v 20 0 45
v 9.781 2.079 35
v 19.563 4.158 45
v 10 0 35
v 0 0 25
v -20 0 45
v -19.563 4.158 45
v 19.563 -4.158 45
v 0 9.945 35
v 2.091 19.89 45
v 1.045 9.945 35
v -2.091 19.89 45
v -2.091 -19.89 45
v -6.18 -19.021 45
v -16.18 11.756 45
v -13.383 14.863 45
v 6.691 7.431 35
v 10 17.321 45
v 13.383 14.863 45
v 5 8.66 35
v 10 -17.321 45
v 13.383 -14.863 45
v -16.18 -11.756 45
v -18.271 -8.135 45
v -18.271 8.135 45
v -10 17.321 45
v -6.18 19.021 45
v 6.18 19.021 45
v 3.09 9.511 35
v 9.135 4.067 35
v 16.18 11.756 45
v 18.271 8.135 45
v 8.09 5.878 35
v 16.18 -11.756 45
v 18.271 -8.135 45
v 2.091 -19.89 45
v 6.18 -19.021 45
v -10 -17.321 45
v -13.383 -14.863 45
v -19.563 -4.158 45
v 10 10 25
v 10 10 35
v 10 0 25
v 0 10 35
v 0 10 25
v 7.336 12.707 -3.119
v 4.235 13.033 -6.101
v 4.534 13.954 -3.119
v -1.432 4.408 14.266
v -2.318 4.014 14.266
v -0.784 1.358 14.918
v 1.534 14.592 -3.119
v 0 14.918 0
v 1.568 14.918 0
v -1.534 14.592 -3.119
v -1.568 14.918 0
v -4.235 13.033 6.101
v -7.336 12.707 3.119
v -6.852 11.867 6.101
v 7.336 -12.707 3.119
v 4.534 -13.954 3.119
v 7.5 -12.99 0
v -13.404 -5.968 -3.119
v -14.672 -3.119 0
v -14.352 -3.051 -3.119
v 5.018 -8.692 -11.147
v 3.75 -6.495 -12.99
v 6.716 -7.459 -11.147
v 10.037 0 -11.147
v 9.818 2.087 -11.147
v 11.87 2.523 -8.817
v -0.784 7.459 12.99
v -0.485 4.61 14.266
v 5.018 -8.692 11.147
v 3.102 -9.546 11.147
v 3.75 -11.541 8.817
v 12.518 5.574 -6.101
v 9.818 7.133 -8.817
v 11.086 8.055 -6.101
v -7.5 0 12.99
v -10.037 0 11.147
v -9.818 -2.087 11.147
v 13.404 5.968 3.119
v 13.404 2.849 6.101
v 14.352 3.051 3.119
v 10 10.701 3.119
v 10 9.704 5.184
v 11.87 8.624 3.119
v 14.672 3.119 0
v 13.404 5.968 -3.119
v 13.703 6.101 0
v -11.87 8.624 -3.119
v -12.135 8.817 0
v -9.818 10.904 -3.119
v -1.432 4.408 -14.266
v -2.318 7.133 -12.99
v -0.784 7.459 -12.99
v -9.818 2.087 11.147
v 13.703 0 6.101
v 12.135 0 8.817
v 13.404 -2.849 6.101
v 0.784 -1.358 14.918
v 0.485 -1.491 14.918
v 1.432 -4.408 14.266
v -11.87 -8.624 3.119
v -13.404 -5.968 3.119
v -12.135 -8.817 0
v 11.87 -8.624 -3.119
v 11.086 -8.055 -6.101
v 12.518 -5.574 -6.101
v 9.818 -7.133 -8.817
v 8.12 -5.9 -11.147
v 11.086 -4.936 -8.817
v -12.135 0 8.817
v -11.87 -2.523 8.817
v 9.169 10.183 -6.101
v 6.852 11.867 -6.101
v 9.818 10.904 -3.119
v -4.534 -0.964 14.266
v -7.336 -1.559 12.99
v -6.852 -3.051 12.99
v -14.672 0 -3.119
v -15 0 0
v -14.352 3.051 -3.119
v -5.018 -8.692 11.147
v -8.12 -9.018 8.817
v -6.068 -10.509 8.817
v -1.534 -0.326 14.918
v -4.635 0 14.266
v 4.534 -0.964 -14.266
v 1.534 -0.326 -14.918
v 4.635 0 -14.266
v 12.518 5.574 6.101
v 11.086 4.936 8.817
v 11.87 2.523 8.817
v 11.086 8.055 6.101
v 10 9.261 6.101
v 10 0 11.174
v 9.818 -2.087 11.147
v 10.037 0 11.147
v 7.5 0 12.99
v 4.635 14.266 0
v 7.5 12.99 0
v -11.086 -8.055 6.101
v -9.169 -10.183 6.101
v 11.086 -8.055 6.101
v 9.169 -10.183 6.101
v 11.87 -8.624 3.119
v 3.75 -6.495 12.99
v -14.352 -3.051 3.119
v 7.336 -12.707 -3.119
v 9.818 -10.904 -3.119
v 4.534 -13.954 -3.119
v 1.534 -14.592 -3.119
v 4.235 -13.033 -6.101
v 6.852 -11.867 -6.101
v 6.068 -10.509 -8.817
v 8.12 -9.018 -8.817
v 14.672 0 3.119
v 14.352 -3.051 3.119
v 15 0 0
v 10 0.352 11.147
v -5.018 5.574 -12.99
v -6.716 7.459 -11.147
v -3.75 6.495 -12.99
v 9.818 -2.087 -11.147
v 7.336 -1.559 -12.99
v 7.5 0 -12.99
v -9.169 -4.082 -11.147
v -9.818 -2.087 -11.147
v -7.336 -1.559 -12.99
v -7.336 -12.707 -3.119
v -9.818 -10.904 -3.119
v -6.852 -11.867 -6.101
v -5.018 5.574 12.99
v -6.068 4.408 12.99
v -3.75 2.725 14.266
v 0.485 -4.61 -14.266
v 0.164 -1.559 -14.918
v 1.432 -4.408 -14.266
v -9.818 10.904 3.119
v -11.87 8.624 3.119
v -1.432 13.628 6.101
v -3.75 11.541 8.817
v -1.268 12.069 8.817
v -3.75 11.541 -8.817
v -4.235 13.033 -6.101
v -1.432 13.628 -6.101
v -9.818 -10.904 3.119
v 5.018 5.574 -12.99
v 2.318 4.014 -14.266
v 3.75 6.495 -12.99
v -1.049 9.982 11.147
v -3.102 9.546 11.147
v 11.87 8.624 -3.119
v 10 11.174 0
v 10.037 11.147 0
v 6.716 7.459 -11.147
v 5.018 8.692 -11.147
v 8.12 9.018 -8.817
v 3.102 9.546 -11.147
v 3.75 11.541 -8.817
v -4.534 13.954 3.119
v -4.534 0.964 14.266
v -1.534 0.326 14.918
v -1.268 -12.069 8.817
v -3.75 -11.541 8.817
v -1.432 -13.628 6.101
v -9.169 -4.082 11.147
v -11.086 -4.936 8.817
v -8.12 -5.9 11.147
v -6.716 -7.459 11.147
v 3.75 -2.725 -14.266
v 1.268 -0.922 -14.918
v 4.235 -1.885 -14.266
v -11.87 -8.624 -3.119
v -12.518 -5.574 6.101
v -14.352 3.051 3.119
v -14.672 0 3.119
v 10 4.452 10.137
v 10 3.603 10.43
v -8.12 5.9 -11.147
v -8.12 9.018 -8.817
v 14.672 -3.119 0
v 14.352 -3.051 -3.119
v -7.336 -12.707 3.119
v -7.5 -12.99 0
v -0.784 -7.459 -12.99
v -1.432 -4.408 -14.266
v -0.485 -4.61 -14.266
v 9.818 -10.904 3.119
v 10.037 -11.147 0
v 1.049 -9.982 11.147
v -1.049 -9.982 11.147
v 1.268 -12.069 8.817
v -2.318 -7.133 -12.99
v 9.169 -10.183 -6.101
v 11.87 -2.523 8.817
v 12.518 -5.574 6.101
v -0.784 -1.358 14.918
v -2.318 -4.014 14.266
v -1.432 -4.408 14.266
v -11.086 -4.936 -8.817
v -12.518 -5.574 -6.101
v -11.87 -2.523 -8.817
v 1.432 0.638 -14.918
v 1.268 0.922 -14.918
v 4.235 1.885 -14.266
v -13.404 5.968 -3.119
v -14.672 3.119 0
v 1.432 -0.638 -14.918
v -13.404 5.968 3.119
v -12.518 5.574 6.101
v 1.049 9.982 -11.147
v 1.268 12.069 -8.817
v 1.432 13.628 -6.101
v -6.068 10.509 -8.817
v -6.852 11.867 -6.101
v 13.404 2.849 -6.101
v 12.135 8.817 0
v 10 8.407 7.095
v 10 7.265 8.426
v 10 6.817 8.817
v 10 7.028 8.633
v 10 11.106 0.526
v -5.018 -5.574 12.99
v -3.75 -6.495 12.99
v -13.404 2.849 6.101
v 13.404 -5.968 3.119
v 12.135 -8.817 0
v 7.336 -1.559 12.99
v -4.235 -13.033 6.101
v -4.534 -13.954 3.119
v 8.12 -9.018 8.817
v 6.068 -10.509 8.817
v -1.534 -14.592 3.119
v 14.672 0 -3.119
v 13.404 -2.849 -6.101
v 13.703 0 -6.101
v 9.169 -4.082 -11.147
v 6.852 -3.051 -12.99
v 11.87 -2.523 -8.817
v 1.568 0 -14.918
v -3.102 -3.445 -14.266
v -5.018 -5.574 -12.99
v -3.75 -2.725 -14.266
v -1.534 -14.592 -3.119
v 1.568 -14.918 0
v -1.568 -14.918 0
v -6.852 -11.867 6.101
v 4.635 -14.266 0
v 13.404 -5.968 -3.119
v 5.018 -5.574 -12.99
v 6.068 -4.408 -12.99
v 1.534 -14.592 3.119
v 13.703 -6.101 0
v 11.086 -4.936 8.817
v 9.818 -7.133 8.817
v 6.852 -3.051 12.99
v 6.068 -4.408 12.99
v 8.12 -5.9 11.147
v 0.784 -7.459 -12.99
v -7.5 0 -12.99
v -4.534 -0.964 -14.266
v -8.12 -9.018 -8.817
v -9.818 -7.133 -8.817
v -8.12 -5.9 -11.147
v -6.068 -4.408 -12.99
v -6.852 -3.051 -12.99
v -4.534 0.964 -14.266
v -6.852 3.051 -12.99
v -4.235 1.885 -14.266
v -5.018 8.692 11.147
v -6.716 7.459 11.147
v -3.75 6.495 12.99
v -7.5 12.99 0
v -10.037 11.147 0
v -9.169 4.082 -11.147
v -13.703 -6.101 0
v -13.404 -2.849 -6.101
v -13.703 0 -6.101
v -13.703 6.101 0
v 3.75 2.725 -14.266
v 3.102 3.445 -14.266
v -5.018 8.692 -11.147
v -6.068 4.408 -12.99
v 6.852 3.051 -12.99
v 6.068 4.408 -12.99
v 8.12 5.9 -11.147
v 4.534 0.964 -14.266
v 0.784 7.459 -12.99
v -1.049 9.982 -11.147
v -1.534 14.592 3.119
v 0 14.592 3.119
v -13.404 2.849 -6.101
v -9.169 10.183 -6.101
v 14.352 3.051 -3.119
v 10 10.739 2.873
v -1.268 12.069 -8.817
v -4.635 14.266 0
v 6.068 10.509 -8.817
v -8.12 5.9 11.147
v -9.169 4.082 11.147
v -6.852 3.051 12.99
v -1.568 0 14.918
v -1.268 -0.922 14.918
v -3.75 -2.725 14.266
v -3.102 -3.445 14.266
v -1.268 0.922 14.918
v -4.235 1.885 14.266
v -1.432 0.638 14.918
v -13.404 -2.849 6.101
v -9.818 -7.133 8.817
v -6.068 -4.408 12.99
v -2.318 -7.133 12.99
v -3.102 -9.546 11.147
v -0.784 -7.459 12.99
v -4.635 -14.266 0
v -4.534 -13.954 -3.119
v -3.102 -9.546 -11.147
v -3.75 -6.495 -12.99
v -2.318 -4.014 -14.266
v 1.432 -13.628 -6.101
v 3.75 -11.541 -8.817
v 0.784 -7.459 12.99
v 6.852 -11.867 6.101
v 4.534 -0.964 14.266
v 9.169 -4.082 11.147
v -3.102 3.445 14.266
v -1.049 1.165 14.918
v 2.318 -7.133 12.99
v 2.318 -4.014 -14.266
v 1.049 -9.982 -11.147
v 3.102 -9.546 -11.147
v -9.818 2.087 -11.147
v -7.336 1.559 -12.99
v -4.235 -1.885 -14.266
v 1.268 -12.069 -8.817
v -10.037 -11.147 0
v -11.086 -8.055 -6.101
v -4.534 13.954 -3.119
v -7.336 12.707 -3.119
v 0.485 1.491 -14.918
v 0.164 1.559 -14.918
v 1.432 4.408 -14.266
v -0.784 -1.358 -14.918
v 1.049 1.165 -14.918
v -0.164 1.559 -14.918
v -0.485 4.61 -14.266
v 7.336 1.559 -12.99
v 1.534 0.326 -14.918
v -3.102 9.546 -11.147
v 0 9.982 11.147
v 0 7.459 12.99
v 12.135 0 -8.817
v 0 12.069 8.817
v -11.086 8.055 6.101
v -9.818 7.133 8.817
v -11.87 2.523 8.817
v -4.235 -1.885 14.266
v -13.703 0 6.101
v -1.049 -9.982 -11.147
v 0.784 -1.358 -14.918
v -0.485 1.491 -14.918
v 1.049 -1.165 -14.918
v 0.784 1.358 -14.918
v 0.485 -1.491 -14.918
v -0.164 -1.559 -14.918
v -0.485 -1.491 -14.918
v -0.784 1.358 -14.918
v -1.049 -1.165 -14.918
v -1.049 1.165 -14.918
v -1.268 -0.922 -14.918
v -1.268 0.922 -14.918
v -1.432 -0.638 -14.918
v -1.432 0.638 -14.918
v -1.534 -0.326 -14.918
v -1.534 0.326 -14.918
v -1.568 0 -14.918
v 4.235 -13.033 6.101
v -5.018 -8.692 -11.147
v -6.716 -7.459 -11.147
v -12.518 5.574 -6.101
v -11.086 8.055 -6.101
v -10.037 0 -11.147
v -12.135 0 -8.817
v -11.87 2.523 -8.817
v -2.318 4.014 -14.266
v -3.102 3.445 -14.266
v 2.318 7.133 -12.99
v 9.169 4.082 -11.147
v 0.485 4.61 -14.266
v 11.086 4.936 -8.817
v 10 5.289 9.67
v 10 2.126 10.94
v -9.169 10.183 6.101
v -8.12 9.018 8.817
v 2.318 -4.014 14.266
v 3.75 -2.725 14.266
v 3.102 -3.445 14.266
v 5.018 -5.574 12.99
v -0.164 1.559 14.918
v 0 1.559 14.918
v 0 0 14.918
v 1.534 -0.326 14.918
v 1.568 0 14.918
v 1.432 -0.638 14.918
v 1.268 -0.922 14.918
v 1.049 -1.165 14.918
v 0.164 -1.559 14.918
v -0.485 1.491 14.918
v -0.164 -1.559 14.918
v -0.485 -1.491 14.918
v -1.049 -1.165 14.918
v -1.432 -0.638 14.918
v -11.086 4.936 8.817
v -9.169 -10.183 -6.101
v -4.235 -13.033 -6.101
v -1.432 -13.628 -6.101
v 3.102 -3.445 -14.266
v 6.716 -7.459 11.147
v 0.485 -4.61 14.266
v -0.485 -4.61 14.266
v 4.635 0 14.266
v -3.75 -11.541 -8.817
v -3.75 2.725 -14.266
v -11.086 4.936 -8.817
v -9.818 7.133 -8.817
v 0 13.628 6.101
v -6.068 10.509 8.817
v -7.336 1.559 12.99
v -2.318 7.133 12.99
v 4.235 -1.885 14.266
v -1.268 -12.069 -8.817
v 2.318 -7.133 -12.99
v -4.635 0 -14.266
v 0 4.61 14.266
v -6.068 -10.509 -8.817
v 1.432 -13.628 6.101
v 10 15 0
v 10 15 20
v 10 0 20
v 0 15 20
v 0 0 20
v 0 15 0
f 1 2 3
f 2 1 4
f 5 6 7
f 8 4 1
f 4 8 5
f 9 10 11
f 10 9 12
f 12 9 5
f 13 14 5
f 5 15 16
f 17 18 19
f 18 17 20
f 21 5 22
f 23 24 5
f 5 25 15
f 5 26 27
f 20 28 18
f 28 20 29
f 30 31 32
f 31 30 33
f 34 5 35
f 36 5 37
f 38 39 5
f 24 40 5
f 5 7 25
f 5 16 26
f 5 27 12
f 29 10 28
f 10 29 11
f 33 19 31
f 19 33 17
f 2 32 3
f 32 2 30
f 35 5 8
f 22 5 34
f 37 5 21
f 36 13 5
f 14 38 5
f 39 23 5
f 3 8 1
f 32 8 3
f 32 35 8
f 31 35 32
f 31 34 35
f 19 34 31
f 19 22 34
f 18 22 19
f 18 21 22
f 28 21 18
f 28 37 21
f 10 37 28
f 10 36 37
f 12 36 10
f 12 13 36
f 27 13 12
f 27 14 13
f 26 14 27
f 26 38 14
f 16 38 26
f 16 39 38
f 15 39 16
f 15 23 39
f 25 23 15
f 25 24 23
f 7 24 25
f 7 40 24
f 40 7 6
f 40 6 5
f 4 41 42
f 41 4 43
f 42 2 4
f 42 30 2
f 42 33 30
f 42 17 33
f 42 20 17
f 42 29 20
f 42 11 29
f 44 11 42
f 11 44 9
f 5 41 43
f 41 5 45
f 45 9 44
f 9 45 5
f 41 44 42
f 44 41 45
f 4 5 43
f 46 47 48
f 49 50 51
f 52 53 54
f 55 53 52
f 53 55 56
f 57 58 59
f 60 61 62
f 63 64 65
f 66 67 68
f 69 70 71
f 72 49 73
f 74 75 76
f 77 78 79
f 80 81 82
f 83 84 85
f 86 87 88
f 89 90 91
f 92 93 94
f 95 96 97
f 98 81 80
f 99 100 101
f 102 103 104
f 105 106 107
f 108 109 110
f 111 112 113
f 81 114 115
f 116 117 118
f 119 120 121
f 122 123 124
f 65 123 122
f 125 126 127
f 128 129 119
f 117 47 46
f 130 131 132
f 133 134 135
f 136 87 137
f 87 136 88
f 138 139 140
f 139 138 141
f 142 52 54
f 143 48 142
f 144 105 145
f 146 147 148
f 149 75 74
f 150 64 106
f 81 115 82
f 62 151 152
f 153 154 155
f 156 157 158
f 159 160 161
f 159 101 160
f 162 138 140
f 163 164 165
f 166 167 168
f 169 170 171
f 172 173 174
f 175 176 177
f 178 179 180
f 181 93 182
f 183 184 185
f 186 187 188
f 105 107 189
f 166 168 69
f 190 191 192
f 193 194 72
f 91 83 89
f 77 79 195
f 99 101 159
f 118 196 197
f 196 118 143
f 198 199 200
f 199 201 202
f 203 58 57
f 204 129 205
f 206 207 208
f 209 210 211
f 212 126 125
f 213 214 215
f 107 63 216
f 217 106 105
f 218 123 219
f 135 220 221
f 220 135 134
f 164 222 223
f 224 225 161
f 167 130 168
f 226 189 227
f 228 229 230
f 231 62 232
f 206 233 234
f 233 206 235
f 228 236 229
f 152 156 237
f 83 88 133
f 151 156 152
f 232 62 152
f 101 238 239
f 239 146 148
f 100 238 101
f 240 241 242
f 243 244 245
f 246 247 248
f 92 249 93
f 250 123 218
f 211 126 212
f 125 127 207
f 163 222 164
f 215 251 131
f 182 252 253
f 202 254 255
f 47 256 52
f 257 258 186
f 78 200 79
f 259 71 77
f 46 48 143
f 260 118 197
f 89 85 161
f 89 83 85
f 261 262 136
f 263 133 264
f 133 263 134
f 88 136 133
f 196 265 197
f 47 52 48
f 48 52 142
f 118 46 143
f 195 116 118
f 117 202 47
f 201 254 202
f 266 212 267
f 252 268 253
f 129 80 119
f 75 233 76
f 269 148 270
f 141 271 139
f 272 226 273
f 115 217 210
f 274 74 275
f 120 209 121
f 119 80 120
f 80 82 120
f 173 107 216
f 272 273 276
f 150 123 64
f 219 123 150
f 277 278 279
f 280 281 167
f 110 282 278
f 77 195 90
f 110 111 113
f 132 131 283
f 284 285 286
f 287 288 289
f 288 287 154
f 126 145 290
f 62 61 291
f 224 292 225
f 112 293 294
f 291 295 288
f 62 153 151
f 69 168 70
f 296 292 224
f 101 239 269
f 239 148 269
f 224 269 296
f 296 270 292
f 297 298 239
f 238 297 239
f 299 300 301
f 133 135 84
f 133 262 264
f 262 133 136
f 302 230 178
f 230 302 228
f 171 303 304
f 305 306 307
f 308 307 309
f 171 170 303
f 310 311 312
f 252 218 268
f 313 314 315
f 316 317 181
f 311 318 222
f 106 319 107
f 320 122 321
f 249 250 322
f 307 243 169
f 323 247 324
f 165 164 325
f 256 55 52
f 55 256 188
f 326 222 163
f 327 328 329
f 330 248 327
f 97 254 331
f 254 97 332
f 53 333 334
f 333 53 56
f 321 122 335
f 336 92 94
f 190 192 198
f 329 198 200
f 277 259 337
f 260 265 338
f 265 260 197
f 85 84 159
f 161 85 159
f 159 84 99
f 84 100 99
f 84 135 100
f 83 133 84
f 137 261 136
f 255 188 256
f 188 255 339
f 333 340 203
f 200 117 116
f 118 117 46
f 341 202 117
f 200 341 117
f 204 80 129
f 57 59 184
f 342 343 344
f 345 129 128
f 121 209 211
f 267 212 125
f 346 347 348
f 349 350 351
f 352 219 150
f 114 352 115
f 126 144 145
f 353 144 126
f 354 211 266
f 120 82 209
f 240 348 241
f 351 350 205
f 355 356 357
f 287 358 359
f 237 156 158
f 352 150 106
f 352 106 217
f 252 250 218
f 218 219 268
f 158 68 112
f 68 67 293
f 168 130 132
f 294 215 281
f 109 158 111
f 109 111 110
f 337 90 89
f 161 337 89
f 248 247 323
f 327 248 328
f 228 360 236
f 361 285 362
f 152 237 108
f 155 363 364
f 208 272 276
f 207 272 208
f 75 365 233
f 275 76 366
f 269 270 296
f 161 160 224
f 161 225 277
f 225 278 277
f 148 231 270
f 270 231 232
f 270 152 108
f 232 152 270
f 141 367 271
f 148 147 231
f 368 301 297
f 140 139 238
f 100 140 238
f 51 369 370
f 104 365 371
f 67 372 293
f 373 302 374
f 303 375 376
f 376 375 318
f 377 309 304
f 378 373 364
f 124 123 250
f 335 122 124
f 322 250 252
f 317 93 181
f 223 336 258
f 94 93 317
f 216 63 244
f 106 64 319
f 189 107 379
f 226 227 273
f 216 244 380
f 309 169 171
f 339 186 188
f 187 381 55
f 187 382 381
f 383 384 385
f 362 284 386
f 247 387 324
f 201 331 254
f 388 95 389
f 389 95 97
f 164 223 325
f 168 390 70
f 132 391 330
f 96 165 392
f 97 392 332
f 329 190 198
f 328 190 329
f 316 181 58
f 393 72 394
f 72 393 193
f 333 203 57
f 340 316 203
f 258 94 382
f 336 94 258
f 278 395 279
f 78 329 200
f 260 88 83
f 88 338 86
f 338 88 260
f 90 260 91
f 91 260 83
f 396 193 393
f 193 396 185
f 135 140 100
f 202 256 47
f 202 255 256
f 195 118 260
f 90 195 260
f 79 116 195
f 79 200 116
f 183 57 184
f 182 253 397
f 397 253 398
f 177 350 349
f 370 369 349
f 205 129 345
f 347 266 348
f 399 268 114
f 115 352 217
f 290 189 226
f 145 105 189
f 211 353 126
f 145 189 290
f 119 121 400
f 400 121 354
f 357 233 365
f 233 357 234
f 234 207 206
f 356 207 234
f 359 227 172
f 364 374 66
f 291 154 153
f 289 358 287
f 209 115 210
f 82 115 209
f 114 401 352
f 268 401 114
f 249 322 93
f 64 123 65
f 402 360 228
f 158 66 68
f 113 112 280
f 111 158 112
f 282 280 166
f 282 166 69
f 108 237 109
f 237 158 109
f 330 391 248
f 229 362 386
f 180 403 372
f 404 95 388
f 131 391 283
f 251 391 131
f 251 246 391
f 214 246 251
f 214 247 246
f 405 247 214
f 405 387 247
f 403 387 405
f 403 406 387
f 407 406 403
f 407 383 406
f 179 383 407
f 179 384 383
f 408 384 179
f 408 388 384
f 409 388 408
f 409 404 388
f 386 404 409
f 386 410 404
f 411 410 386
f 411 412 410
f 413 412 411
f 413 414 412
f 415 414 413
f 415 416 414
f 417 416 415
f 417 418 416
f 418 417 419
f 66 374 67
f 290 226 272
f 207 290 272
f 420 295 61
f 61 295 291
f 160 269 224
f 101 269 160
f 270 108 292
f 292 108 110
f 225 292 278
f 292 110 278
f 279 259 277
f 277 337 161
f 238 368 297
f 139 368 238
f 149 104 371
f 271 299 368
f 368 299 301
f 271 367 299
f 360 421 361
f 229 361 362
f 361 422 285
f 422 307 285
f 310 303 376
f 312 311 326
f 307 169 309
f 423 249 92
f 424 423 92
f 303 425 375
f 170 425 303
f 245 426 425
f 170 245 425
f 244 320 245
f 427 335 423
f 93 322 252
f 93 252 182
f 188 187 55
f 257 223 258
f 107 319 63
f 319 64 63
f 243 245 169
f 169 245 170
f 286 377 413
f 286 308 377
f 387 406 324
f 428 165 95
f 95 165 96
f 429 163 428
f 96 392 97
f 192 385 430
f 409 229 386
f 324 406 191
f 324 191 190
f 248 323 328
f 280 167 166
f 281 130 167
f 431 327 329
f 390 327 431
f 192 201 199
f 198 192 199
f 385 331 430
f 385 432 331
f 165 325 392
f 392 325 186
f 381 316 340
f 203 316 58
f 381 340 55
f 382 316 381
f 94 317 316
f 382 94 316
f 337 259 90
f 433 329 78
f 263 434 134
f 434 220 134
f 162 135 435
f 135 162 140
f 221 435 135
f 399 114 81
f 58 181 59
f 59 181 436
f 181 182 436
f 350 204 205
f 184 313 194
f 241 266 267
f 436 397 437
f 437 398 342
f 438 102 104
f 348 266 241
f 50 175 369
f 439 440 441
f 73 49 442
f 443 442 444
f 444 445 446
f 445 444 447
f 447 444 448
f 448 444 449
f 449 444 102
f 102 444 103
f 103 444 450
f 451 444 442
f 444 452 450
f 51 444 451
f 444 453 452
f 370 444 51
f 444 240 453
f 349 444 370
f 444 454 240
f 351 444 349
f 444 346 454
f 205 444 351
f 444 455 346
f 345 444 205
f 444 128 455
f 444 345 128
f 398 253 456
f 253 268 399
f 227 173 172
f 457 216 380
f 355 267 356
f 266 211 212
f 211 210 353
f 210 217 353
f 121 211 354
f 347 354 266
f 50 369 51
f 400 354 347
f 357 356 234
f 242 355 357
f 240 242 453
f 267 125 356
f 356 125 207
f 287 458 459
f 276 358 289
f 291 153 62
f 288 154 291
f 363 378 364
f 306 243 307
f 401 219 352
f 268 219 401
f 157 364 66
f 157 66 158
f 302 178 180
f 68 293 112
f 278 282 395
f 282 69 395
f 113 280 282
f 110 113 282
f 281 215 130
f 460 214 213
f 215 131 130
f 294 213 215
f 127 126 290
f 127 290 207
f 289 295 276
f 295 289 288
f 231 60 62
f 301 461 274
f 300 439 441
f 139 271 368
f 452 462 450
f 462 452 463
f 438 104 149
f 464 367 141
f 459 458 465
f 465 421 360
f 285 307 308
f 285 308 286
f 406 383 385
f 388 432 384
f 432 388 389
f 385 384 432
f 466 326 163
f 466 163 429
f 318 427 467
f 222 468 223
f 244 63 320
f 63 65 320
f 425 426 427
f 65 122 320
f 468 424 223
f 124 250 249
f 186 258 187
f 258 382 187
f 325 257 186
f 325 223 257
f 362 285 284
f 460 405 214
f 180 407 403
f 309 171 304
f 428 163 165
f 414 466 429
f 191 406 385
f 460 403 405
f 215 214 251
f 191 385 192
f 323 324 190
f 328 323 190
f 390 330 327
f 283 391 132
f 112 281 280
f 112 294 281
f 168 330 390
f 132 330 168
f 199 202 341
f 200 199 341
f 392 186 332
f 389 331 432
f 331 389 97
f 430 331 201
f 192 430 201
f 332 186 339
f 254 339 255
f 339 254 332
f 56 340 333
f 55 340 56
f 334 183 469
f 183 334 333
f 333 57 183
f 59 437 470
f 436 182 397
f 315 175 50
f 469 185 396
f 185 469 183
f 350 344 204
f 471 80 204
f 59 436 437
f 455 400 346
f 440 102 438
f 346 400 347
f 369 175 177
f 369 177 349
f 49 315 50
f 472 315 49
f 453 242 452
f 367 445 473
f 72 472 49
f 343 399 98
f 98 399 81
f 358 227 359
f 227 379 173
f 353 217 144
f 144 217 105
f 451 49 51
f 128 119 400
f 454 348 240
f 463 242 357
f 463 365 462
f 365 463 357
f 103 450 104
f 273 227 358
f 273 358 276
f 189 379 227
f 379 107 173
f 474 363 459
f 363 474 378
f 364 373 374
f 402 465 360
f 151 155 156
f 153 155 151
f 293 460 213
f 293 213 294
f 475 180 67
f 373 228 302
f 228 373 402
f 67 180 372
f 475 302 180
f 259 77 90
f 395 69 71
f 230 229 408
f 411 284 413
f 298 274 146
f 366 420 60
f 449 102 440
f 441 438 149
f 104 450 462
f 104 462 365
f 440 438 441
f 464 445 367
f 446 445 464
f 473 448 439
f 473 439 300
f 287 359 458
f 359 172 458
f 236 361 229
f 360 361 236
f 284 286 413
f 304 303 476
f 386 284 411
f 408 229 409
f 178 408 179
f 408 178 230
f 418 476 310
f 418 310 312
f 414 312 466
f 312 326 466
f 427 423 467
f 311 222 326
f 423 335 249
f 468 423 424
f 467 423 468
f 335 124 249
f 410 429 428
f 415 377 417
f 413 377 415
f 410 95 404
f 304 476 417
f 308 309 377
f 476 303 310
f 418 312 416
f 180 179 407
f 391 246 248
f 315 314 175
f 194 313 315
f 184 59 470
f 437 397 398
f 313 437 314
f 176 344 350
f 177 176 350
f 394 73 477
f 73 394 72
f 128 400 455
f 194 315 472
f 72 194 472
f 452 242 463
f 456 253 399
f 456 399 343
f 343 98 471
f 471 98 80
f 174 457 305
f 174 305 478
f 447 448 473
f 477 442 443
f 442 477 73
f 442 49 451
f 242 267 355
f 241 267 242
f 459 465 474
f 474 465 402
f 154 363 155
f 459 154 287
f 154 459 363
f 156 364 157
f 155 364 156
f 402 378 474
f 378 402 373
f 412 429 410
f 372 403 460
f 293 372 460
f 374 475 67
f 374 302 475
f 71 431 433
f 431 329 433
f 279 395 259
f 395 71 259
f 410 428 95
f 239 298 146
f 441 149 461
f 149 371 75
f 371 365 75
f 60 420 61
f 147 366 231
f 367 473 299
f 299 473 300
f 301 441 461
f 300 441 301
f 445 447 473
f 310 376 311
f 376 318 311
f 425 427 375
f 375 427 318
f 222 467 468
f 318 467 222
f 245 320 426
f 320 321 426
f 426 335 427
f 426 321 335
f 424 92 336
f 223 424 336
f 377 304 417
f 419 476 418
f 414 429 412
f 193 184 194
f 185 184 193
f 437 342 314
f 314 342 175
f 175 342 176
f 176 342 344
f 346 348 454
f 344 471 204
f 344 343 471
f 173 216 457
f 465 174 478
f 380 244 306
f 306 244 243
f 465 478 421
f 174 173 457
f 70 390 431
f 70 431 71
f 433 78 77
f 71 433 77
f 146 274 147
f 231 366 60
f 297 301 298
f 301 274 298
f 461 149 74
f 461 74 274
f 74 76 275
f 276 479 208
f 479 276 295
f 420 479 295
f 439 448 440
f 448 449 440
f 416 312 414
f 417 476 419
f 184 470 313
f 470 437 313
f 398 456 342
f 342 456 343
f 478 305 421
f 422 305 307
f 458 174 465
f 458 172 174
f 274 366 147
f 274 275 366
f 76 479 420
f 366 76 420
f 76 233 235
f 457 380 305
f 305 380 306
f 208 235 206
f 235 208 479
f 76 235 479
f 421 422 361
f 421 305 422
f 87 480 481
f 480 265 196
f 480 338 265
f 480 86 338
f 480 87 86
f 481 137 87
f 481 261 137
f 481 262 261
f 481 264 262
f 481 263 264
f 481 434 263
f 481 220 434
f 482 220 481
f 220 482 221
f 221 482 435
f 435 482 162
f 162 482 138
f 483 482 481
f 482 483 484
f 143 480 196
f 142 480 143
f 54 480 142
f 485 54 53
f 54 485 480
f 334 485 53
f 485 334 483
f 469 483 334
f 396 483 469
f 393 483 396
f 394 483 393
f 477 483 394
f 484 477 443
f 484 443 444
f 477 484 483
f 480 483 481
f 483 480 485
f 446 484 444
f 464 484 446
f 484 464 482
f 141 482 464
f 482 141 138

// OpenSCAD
union() {
    sphere(r = 1.5e1);
    cube([1.0e1, 1.5e1, 2.0e1]);
    translate([0.0e0, 0.0e0, 2.5e1]) union() {
        cylinder(r1 = 0.0e0, r2 = 2.0e1, 2.0e1);
        cube([1.0e1, 1.0e1, 1.0e1]);
    }
    linear_extrude(height = 7.0e0) translate([2.0e1, 0.0e0]) difference() {
        circle([1.0e1]);
        circle([1.0e1]);
    }
}
